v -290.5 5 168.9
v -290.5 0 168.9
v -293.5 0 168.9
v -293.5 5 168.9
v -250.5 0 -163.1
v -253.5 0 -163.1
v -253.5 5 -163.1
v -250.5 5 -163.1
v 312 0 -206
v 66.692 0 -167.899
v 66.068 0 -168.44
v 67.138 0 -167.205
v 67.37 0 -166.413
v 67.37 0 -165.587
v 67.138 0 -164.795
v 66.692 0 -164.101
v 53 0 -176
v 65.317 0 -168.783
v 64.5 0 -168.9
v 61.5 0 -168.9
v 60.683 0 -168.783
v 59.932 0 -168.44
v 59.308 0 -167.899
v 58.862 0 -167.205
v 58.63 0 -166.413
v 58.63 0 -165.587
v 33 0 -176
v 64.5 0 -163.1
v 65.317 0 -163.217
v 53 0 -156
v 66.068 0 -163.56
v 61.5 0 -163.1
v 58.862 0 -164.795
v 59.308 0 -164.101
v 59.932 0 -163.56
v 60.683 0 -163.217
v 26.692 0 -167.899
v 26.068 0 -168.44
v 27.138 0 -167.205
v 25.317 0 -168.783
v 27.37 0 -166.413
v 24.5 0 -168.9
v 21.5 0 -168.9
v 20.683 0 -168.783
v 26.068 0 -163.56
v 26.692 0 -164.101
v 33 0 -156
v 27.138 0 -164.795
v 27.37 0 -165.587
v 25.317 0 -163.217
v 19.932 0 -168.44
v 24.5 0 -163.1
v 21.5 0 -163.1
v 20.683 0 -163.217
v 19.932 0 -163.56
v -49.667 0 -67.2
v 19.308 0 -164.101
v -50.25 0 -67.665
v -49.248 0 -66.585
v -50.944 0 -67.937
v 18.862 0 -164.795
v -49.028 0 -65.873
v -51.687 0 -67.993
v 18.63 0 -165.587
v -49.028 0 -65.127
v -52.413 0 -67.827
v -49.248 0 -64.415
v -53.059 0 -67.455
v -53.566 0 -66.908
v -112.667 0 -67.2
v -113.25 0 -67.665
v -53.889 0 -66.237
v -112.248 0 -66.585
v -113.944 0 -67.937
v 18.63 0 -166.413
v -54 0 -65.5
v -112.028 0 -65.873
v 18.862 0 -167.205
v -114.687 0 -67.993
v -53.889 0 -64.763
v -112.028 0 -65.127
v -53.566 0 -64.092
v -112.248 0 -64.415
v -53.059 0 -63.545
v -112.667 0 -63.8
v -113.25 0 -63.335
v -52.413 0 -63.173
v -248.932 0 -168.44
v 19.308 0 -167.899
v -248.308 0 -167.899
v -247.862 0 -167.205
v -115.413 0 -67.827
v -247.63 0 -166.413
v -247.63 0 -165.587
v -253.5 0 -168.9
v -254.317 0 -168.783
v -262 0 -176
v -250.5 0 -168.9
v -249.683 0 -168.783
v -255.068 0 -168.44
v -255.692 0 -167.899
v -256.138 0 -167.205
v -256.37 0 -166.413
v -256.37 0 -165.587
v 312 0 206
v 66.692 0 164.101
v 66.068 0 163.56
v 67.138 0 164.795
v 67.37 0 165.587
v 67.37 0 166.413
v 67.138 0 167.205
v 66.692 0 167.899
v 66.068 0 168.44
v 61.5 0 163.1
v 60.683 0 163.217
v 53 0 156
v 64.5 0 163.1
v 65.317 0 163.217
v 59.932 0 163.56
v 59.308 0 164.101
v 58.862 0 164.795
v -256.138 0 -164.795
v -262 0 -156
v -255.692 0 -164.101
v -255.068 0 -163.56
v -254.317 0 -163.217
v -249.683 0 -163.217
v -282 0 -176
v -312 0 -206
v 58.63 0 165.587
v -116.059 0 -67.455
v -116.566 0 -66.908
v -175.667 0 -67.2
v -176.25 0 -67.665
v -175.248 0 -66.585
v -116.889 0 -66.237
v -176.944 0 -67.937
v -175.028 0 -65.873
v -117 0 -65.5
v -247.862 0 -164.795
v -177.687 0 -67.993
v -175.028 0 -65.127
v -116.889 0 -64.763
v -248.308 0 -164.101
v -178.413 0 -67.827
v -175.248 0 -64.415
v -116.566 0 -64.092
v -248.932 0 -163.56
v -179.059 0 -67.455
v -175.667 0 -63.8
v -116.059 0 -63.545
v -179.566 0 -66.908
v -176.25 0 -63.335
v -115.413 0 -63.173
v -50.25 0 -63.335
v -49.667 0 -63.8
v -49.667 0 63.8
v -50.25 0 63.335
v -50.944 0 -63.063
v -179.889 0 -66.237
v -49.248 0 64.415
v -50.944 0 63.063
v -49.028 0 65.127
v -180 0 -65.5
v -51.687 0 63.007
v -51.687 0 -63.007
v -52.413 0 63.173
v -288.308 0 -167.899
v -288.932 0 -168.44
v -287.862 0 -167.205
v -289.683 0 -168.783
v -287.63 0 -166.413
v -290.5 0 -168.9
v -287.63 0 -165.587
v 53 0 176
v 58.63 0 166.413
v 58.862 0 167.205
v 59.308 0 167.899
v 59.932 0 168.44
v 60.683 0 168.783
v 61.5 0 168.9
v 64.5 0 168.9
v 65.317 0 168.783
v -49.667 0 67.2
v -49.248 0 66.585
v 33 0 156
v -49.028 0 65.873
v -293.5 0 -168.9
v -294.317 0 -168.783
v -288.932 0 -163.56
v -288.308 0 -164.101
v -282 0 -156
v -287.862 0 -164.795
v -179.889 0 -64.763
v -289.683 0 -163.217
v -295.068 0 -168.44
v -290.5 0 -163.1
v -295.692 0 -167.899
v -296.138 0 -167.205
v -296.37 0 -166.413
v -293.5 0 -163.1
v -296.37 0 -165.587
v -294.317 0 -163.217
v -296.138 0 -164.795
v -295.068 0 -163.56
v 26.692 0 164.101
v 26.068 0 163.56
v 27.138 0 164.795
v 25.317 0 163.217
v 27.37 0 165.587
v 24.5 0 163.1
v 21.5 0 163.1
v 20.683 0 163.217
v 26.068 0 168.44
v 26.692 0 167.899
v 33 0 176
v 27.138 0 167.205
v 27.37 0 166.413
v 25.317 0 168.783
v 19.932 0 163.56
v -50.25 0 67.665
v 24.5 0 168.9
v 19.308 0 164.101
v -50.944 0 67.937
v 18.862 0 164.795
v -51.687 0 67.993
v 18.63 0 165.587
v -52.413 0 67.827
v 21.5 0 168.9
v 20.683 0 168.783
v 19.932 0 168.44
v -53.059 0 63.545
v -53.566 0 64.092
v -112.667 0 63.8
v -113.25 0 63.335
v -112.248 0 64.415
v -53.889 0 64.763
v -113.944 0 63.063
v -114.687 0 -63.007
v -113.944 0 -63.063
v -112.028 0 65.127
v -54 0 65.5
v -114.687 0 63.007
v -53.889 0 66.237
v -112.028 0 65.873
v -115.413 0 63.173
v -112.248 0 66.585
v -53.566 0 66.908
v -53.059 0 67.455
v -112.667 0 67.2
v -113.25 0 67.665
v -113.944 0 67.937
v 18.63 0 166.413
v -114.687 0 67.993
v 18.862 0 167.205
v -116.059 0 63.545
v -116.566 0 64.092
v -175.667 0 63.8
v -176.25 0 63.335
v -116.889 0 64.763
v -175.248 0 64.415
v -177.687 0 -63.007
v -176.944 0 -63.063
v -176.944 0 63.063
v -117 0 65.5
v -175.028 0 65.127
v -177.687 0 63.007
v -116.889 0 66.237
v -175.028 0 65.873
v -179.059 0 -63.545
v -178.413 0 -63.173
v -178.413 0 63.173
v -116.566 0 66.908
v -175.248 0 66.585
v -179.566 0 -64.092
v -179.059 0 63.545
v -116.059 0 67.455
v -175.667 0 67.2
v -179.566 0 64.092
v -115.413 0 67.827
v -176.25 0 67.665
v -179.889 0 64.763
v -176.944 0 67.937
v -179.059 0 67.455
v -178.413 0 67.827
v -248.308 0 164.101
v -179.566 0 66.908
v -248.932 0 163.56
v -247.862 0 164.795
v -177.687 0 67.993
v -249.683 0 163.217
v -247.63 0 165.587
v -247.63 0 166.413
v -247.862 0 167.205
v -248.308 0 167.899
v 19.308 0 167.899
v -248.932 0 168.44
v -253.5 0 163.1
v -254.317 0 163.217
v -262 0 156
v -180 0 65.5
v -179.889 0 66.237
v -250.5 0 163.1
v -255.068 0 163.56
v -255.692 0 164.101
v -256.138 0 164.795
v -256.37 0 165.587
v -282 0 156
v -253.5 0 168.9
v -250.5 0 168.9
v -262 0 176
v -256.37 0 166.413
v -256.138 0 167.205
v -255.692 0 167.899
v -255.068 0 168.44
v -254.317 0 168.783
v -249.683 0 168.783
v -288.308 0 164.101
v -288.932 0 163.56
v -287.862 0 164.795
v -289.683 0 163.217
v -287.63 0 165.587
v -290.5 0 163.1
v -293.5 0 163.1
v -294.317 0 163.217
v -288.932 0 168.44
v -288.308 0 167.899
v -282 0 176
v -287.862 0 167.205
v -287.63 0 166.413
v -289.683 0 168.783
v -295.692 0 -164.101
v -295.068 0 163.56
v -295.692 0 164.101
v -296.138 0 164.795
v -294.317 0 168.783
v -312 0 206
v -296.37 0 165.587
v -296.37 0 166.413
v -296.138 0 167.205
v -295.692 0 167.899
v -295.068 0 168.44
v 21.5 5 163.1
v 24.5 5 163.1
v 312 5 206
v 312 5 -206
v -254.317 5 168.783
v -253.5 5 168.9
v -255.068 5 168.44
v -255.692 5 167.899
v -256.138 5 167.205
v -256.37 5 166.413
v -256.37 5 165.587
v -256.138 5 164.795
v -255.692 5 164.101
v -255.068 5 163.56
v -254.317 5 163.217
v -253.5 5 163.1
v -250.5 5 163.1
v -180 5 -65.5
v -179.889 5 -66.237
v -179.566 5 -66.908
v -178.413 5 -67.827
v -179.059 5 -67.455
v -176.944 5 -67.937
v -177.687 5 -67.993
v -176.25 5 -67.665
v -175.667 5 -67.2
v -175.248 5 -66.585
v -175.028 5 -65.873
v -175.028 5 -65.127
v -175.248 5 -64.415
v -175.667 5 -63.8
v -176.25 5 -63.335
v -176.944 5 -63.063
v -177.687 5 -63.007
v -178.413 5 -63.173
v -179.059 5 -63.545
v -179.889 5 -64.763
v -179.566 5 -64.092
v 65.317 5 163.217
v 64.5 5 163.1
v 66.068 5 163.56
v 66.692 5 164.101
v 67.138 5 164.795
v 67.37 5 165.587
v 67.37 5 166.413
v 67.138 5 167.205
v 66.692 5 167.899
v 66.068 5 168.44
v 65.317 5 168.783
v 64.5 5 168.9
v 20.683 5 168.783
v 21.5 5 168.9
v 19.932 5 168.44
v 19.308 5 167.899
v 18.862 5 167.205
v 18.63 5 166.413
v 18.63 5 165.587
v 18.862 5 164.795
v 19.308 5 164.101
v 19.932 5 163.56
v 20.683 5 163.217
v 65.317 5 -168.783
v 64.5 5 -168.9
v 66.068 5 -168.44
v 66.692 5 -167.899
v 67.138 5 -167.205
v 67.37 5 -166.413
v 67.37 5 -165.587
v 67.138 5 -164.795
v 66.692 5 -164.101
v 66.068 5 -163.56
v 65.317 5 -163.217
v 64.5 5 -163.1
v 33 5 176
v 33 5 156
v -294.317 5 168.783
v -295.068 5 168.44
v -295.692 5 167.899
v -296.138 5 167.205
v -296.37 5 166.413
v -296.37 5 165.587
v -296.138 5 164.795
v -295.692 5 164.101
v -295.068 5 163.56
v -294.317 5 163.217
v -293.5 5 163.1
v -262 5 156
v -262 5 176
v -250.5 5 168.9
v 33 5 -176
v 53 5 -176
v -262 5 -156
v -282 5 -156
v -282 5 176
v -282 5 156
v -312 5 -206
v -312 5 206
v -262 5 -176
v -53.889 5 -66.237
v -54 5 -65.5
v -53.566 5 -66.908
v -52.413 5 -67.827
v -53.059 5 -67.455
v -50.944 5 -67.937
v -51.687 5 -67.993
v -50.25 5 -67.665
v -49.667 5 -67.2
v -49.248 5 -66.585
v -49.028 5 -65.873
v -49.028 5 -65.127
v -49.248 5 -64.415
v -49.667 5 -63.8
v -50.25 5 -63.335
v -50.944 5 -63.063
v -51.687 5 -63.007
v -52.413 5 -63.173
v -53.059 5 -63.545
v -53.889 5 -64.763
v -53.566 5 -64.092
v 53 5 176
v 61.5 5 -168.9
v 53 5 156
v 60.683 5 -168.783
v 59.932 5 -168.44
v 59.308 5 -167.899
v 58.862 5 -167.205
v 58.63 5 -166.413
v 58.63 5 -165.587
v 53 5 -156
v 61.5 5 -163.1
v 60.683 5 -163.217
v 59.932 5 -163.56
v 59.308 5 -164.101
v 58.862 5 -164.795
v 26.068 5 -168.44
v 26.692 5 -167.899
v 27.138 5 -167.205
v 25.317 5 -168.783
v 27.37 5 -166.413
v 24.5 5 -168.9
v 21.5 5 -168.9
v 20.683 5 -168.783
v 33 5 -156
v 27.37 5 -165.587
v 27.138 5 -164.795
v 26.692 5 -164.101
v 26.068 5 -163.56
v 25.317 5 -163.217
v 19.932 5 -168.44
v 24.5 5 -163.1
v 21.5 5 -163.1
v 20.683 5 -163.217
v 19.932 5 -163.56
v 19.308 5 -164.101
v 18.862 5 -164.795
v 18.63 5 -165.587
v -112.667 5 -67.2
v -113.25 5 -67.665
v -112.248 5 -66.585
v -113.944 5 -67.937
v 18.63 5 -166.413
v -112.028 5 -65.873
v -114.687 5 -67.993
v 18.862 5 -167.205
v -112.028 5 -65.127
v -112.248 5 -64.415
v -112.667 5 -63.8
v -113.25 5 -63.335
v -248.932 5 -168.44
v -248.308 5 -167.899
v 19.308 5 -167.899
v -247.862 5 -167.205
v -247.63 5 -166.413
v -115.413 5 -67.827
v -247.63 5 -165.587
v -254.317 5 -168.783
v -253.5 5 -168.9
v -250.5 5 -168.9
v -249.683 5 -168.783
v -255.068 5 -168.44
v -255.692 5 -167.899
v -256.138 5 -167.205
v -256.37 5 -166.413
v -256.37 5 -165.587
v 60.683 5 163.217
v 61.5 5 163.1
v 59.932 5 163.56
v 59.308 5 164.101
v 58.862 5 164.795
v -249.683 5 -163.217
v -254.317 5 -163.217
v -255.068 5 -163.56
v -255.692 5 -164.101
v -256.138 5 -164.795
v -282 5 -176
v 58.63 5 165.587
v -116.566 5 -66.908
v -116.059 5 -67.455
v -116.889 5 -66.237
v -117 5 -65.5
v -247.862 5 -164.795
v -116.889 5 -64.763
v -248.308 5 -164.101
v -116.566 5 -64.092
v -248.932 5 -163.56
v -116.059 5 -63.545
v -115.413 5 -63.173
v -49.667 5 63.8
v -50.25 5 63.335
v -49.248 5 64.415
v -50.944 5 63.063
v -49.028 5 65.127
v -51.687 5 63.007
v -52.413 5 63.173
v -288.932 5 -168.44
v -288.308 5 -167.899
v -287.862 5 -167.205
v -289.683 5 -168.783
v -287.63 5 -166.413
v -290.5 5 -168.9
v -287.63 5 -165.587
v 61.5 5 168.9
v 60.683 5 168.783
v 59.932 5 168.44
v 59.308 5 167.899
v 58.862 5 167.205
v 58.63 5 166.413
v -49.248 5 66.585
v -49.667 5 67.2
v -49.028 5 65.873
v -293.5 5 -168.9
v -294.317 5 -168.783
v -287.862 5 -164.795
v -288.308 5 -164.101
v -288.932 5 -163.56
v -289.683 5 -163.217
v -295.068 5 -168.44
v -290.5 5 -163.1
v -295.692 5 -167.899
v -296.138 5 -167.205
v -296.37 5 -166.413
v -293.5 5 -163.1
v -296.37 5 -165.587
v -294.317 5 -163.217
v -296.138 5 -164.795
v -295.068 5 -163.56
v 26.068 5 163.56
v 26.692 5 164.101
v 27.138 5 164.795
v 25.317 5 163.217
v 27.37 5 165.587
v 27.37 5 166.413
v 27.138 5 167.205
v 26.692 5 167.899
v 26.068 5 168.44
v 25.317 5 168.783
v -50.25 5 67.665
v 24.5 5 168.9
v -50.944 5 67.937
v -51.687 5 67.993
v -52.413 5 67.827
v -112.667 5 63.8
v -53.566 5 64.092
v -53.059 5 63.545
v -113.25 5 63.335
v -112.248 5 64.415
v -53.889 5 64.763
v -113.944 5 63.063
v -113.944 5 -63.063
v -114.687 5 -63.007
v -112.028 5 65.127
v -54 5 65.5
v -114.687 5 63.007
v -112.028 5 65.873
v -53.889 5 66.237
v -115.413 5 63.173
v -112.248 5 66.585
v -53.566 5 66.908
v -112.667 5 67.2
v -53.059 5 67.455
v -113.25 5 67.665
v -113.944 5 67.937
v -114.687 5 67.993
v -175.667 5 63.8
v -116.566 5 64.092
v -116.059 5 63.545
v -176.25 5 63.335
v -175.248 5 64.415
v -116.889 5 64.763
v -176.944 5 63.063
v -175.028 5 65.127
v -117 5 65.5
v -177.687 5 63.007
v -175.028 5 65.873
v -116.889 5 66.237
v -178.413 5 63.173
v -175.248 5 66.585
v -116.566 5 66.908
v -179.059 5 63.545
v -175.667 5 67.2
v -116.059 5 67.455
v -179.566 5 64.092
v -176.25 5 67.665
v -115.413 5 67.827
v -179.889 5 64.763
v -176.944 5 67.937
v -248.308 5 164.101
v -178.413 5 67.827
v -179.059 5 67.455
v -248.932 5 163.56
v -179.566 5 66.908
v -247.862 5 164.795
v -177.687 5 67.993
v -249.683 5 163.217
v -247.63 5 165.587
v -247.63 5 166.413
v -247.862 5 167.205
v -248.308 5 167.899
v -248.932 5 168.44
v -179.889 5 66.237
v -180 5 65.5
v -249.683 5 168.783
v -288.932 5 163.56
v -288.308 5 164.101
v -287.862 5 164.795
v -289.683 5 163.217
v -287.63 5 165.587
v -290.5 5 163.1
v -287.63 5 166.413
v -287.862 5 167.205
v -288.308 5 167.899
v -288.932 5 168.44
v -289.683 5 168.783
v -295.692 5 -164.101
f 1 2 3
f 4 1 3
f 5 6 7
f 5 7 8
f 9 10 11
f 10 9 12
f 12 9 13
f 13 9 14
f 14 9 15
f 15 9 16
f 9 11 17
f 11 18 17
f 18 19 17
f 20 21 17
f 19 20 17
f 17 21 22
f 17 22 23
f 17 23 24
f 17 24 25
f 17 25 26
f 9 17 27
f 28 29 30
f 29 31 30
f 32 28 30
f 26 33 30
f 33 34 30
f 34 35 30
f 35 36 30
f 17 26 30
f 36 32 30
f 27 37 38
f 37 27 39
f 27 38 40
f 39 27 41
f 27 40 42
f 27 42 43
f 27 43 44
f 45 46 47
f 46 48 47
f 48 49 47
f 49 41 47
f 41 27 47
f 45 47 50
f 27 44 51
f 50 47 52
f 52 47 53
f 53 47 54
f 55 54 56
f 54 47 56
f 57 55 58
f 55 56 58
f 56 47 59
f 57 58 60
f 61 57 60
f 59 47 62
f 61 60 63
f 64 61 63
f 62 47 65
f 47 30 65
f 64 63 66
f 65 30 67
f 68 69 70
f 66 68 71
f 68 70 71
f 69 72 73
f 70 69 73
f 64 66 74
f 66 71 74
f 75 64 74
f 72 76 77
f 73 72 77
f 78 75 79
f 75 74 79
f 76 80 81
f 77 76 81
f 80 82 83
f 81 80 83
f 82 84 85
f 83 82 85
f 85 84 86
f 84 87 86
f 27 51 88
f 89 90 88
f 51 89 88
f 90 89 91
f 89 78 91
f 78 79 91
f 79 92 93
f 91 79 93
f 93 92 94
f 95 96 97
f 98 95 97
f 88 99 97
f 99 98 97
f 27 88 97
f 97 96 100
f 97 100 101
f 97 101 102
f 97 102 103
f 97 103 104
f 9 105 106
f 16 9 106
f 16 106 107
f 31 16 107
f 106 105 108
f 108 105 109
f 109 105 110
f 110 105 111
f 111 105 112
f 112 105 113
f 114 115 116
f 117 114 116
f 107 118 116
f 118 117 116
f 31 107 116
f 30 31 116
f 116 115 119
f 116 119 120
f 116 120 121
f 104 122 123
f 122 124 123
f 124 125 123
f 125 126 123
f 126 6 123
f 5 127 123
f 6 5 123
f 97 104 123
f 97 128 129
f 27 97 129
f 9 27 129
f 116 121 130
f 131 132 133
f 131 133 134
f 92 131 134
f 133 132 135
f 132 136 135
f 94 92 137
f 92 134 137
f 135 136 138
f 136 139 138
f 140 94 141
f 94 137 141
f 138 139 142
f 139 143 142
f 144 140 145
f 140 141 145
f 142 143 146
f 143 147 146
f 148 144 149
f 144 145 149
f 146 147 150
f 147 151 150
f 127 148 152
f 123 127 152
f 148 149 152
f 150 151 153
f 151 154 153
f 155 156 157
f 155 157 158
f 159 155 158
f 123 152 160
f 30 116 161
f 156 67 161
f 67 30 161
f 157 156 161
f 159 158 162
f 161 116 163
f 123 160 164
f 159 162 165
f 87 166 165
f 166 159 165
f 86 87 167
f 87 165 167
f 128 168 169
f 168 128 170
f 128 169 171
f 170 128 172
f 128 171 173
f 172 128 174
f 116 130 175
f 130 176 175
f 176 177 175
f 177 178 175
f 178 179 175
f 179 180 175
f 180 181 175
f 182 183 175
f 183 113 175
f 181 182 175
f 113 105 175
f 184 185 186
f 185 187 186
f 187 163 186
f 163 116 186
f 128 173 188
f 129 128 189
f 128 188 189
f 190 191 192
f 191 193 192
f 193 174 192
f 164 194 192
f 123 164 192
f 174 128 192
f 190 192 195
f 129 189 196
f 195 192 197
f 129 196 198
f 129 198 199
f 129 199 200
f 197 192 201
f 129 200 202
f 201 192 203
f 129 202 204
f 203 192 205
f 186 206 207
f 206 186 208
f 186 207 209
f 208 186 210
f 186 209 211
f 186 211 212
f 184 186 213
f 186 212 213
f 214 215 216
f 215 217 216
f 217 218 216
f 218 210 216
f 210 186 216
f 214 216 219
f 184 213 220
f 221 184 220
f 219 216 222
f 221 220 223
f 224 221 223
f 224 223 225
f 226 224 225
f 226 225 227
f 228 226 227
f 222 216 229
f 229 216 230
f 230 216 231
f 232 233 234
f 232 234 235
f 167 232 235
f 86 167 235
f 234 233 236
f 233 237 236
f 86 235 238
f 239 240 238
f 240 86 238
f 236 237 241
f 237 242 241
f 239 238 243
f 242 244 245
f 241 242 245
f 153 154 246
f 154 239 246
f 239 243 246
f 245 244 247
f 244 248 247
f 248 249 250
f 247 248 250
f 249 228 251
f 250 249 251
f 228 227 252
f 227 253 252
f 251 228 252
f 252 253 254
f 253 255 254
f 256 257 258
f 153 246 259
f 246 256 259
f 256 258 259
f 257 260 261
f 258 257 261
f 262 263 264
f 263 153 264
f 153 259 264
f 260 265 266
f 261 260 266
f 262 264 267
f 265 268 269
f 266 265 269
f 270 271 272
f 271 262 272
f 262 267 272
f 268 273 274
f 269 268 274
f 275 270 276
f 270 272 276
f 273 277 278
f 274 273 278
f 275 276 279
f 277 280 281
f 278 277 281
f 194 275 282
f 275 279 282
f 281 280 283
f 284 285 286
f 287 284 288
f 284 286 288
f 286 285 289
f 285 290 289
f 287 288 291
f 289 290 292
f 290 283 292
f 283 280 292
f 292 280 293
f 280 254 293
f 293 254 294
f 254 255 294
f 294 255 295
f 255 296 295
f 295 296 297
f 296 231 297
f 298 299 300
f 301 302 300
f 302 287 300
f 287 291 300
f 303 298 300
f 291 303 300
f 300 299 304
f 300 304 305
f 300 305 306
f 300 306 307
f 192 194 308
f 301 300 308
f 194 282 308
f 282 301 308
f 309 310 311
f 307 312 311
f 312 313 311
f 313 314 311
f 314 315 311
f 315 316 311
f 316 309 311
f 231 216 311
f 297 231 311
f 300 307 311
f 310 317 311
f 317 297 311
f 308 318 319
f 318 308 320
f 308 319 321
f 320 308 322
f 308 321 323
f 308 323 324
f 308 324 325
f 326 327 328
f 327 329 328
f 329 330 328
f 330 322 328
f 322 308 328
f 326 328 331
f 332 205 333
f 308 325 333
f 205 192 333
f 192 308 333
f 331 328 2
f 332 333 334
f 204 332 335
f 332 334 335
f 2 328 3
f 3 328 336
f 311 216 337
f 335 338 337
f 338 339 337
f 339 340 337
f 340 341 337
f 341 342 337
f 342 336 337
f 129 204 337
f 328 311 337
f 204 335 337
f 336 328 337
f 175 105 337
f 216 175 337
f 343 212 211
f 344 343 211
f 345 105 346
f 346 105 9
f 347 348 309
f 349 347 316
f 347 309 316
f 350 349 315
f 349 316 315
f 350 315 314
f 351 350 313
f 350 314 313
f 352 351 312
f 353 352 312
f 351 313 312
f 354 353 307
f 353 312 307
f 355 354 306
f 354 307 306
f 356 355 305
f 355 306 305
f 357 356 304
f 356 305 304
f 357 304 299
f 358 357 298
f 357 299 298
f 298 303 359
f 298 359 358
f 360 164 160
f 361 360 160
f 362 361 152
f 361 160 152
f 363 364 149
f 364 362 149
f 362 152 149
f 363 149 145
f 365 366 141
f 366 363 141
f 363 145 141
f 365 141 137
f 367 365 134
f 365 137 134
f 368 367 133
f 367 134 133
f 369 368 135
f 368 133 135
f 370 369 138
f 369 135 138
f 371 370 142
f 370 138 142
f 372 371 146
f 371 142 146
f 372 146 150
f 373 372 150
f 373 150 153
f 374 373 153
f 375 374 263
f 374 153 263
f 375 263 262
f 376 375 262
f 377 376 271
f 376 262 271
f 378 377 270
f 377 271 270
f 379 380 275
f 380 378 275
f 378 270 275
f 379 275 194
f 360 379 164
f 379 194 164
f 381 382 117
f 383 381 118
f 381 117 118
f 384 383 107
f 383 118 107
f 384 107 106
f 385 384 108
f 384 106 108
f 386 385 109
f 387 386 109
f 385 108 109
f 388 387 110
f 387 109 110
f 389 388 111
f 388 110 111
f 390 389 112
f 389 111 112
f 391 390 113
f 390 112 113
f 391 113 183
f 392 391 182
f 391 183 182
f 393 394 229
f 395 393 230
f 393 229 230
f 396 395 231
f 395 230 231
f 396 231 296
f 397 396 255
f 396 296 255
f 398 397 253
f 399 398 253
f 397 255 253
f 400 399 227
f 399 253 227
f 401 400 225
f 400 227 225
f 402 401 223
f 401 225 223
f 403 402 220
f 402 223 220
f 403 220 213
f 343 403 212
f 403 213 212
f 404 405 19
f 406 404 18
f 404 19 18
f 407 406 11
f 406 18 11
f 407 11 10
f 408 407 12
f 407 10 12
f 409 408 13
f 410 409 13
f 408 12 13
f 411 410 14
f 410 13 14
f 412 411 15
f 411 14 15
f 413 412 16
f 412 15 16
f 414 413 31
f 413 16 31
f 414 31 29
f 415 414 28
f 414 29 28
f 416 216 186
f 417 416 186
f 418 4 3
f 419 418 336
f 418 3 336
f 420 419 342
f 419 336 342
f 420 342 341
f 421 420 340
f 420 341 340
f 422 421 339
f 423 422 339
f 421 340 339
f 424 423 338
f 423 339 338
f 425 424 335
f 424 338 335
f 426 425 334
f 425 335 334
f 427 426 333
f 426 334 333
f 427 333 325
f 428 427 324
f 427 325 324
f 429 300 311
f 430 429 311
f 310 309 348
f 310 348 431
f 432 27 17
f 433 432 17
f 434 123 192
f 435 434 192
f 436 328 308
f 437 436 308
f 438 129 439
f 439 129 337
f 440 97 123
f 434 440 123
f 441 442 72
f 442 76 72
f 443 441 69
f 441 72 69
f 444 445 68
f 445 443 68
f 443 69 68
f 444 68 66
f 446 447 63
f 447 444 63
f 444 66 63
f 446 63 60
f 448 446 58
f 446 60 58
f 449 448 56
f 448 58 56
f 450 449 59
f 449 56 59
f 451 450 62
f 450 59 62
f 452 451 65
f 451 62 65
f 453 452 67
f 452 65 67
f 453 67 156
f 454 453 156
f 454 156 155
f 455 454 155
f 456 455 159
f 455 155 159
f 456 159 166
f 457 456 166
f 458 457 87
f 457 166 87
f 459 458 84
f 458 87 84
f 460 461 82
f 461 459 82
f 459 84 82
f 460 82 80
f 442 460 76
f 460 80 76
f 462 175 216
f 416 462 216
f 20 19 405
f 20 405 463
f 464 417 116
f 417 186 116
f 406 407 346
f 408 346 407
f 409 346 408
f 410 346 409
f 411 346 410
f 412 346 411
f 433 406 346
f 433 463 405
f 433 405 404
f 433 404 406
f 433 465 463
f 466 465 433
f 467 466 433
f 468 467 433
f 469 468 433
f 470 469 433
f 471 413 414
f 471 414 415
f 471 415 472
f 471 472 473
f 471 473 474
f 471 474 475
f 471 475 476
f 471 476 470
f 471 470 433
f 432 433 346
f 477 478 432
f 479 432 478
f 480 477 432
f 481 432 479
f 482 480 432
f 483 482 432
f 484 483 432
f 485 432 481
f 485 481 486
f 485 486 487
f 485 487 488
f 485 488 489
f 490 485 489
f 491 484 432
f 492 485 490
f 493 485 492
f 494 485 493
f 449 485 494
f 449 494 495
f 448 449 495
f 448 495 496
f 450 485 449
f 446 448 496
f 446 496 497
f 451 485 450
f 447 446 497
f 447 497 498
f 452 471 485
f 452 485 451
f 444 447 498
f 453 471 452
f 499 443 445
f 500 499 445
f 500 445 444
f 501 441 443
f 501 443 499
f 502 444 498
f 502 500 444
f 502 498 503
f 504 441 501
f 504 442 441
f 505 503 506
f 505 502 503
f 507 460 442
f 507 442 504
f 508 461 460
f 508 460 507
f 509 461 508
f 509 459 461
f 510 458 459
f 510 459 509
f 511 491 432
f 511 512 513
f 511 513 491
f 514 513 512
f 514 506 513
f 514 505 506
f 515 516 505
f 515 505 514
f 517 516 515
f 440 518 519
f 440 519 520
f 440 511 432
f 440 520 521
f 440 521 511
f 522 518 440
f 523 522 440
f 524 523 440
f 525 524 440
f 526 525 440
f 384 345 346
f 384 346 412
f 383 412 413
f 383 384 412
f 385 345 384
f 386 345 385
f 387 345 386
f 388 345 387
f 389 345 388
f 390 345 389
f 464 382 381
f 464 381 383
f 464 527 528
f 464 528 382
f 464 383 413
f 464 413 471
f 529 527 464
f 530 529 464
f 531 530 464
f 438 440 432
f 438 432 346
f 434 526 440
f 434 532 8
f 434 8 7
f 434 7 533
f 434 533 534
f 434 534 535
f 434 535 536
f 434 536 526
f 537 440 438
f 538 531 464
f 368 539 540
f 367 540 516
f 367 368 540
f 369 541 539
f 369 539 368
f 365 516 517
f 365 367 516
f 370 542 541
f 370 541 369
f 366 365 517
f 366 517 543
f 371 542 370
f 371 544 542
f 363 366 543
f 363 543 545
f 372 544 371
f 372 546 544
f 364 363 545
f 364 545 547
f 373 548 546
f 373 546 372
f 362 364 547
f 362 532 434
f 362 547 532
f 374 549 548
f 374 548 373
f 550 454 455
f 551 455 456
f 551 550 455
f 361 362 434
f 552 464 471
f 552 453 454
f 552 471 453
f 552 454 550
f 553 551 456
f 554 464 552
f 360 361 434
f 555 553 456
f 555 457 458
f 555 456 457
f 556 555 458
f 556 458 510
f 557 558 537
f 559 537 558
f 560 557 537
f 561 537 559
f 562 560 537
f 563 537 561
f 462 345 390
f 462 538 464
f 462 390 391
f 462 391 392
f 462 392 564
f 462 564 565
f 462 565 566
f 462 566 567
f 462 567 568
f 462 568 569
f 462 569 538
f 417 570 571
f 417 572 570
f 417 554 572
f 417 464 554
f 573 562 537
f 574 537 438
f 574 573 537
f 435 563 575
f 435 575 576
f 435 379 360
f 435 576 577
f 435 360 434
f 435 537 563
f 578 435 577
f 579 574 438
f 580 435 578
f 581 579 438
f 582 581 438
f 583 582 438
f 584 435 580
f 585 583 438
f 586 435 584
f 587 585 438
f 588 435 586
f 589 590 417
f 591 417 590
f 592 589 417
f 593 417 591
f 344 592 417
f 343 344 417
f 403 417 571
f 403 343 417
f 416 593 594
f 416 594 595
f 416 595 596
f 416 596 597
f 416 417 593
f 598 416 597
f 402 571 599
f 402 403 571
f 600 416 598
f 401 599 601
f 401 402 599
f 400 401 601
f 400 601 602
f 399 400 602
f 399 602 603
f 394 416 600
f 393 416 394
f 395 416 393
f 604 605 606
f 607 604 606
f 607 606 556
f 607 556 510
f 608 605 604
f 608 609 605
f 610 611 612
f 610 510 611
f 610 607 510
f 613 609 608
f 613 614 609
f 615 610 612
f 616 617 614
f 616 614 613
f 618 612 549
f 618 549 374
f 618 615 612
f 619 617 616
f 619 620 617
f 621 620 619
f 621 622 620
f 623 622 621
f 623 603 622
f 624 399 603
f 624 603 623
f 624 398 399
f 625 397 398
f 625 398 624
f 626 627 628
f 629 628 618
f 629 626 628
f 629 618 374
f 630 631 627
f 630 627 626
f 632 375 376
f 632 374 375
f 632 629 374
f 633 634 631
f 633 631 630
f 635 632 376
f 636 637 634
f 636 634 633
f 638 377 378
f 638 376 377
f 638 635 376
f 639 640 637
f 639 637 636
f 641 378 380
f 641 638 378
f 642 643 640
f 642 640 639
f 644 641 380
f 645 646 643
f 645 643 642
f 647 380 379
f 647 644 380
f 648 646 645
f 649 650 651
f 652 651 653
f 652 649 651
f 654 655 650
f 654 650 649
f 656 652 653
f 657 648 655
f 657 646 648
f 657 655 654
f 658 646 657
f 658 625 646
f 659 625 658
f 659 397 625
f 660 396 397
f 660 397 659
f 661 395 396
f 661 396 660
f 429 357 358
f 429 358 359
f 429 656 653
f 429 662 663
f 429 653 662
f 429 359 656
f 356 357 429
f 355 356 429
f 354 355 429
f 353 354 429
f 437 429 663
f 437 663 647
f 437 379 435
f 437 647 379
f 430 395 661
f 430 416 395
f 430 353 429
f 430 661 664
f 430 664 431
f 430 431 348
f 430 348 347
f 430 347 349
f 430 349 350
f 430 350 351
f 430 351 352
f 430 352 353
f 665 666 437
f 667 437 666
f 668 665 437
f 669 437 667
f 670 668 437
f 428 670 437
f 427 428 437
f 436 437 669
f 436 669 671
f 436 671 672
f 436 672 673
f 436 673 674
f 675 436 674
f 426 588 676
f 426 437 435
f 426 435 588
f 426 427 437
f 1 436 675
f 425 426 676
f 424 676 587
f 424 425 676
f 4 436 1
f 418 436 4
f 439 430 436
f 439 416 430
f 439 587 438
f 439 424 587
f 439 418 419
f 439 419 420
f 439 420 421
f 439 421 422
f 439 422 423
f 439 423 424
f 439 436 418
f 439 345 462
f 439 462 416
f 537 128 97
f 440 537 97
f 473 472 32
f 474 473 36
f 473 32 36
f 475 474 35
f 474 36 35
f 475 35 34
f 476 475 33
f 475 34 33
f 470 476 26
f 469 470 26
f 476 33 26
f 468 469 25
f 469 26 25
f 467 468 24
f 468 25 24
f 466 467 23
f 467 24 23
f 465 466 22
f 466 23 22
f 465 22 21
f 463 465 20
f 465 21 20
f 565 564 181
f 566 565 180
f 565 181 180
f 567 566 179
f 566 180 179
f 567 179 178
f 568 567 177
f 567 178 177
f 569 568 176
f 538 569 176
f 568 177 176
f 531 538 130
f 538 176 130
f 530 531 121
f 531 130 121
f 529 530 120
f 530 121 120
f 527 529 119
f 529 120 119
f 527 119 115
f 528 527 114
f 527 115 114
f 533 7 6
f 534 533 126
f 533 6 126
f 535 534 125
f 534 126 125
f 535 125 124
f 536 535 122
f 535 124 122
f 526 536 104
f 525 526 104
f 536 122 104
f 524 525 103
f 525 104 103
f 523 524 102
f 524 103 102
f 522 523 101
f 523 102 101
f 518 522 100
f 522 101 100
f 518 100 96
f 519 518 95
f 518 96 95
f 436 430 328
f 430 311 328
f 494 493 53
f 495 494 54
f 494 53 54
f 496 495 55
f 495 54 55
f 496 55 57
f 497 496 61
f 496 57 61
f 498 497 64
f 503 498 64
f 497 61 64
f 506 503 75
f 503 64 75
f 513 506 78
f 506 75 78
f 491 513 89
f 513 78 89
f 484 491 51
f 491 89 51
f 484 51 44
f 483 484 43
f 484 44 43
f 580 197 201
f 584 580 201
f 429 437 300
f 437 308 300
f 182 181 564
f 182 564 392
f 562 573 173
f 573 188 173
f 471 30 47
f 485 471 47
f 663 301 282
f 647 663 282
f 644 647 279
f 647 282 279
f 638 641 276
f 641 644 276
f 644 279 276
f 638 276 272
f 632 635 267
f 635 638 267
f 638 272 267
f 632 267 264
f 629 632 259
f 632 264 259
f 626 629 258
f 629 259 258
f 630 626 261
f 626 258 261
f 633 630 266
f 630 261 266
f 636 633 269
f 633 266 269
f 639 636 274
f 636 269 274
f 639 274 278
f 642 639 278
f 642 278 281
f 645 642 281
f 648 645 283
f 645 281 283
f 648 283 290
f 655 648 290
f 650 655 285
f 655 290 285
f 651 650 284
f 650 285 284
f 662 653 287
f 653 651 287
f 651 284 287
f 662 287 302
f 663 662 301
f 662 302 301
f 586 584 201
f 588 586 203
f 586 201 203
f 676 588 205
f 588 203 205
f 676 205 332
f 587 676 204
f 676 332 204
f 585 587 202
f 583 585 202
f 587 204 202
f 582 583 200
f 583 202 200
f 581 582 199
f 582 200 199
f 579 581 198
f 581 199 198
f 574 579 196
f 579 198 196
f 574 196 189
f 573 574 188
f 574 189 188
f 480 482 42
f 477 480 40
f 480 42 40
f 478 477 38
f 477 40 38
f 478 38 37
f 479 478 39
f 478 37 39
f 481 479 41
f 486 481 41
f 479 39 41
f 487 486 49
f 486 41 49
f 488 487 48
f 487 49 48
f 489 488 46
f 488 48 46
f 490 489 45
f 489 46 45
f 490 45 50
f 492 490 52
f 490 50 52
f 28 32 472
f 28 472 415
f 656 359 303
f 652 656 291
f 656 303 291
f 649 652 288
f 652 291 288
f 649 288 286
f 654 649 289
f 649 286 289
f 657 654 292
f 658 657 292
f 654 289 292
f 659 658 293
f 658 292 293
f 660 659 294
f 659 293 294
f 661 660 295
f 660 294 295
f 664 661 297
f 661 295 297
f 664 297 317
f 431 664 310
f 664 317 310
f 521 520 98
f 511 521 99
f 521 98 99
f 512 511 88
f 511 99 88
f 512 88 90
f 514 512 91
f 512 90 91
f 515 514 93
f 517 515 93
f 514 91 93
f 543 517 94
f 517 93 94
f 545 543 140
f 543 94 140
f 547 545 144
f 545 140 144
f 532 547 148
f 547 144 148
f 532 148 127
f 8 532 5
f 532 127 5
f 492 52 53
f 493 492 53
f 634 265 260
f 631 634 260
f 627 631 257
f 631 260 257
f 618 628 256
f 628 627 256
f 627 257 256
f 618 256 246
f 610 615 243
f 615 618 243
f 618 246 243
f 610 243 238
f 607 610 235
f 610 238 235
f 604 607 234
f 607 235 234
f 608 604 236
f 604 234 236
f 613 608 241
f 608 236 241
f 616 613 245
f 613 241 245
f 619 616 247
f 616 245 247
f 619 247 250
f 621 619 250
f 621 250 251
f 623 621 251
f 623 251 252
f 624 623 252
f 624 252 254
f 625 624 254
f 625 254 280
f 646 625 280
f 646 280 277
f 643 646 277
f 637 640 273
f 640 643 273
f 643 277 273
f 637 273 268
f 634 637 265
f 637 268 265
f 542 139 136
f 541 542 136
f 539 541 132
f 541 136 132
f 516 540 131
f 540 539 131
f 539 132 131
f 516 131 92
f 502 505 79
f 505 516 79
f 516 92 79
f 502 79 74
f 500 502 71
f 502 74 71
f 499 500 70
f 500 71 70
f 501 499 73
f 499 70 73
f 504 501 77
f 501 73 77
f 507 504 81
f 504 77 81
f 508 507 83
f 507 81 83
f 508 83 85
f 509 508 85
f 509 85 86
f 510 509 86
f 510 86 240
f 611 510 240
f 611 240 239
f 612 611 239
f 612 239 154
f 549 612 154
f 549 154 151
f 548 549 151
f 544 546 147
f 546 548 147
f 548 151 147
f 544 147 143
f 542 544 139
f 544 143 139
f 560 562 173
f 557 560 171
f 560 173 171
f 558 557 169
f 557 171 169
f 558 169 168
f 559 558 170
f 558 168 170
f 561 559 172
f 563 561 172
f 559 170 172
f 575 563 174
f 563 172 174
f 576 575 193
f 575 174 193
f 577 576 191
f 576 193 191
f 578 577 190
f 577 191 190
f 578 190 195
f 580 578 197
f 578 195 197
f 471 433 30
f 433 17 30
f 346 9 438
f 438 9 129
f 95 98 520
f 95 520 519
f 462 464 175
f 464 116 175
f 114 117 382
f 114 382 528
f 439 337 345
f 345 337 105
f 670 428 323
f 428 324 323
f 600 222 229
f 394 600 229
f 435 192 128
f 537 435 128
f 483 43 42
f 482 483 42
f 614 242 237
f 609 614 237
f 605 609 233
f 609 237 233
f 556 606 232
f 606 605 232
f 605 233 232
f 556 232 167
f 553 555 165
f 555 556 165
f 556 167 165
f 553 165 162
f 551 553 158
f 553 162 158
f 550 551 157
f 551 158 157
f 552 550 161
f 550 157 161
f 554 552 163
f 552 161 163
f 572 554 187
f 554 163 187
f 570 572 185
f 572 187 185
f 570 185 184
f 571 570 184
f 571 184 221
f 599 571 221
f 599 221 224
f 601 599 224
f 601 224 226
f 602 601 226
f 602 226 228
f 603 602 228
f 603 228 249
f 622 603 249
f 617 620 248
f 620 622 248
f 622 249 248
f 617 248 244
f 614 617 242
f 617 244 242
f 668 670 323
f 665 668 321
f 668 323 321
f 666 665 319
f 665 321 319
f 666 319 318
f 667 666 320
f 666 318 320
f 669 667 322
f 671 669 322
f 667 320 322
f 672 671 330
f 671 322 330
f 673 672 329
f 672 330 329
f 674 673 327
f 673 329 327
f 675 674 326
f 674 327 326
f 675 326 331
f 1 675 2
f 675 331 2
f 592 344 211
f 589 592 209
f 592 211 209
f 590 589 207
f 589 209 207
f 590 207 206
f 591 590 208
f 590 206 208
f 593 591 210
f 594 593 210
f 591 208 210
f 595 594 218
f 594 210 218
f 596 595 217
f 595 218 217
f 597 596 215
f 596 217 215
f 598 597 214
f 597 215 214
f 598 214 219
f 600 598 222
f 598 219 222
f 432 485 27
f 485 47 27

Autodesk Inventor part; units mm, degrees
ref_plane "YZ Plane" through (0, 0, 0) normal (1, 0, 0) x (0, 1, 0)
ref_plane "XZ Plane" through (0, 0, 0) normal (0, 1, 0) x (-1, 0, 0)
ref_plane "XY Plane" through (0, 0, 0) normal (0, 0, 1) x (1, 0, 0)
sketch "Sketch1" plane through (0, 0, 0) normal (0, 1, 0) x (-1, 0, 0)
  line L0 (312, 206) -> (-312, 206)
  line L1 (-312, 206) -> (-312, -206)
  line L2 (-312, -206) -> (312, -206)
  line L3 (312, -206) -> (312, 206)
  circle A0 centre (177.5, 65.5) radius 2.5
  line L4 (0, 206) -> (0, -206) construction
  line L5 (312, 0) -> (-312, 0) construction
  circle A1 centre (177.5, -65.5) radius 2.5
  circle A2 centre (114.5, 65.5) radius 2.5
  circle A3 centre (114.5, -65.5) radius 2.5
  circle A4 centre (51.5, 65.5) radius 2.5
  circle A5 centre (51.5, -65.5) radius 2.5
  line L6 (282, -176) -> (262, -176)
  line L7 (262, -176) -> (262, -156)
  line L8 (262, -156) -> (282, -156)
  line L9 (282, -156) -> (282, -176)
  line L10 (-83, -206) -> (-83, 206)
  line L11 (253.5, -166) -> (250.5, -166) construction
  line L12 (253.5, -163.1) -> (250.5, -163.1)
  line L13 (250.5, -168.9) -> (253.5, -168.9)
  arc A6 (253.5, -168.9) -> (253.5, -163.1) centre (253.5, -166) ccw
  arc A7 (250.5, -163.1) -> (250.5, -168.9) centre (250.5, -166) ccw
  line L14 (272, -176) -> (272, -156) construction
  line L15 (290.5, -166) -> (293.5, -166) construction
  line L16 (290.5, -163.1) -> (293.5, -163.1)
  line L17 (293.5, -168.9) -> (290.5, -168.9)
  arc A8 (290.5, -163.1) -> (290.5, -168.9) centre (290.5, -166) ccw
  arc A9 (293.5, -168.9) -> (293.5, -163.1) centre (293.5, -166) ccw
  line L18 (282, -166) -> (262, -166) construction
  line L19 (114.5, 206) -> (114.5, -206) construction
  arc A10 (250.5, 168.9) -> (250.5, 163.1) centre (250.5, 166) ccw
  line L20 (282, 176) -> (282, 156)
  arc A11 (290.5, 168.9) -> (290.5, 163.1) centre (290.5, 166) ccw
  line L21 (290.5, 166) -> (293.5, 166) construction
  line L22 (293.5, 163.1) -> (290.5, 163.1)
  arc A12 (293.5, 163.1) -> (293.5, 168.9) centre (293.5, 166) ccw
  line L23 (290.5, 168.9) -> (293.5, 168.9)
  line L24 (282, 156) -> (262, 156)
  line L25 (272, 156) -> (272, 176) construction
  line L26 (282, 166) -> (262, 166) construction
  line L27 (262, 176) -> (282, 176)
  line L28 (262, 156) -> (262, 176)
  arc A13 (253.5, 163.1) -> (253.5, 168.9) centre (253.5, 166) ccw
  line L29 (253.5, 168.9) -> (250.5, 168.9)
  line L30 (253.5, 166) -> (250.5, 166) construction
  line L31 (250.5, 163.1) -> (253.5, 163.1)
  arc A14 (-64.5, -163.1) -> (-64.5, -168.9) centre (-64.5, -166) ccw
  line L32 (-33, -156) -> (-33, -176)
  arc A15 (-24.5, -163.1) -> (-24.5, -168.9) centre (-24.5, -166) ccw
  line L33 (-24.5, -166) -> (-21.5, -166) construction
  line L34 (-21.5, -168.9) -> (-24.5, -168.9)
  arc A16 (-21.5, -168.9) -> (-21.5, -163.1) centre (-21.5, -166) ccw
  line L35 (-24.5, -163.1) -> (-21.5, -163.1)
  line L36 (-33, -176) -> (-53, -176)
  line L37 (-43, -176) -> (-43, -156) construction
  line L38 (-33, -166) -> (-53, -166) construction
  line L39 (-53, -156) -> (-33, -156)
  line L40 (-53, -176) -> (-53, -156)
  arc A17 (-61.5, -168.9) -> (-61.5, -163.1) centre (-61.5, -166) ccw
  line L41 (-61.5, -163.1) -> (-64.5, -163.1)
  line L42 (-61.5, -166) -> (-64.5, -166) construction
  line L43 (-64.5, -168.9) -> (-61.5, -168.9)
  arc A18 (-64.5, 168.9) -> (-64.5, 163.1) centre (-64.5, 166) ccw
  line L44 (-33, 176) -> (-33, 156)
  arc A19 (-24.5, 168.9) -> (-24.5, 163.1) centre (-24.5, 166) ccw
  line L45 (-24.5, 166) -> (-21.5, 166) construction
  line L46 (-21.5, 163.1) -> (-24.5, 163.1)
  arc A20 (-21.5, 163.1) -> (-21.5, 168.9) centre (-21.5, 166) ccw
  line L47 (-24.5, 168.9) -> (-21.5, 168.9)
  line L48 (-33, 156) -> (-53, 156)
  line L49 (-43, 156) -> (-43, 176) construction
  line L50 (-33, 166) -> (-53, 166) construction
  line L51 (-53, 176) -> (-33, 176)
  line L52 (-53, 156) -> (-53, 176)
  arc A21 (-61.5, 163.1) -> (-61.5, 168.9) centre (-61.5, 166) ccw
  line L53 (-61.5, 168.9) -> (-64.5, 168.9)
  line L54 (-61.5, 166) -> (-64.5, 166) construction
  line L55 (-64.5, 163.1) -> (-61.5, 163.1)
  point P0 (0, 0)
  point P1 (-83, 0)
  point P2 (252, -166)
  point P3 (292, -166)
  point P4 (272, -166)
  point P5 (114.5, 0)
  point P6 (292, 166)
  point P7 (272, 166)
  point P8 (252, 166)
  point P9 (-23, -166)
  point P10 (-43, -166)
  point P11 (-63, -166)
  point P12 (-23, 166)
  point P13 (-43, 166)
  point P14 (-63, 166)
  dimension "d0" = 412
  dimension "d1" = 624
  dimension "d3" = 5
  dimension "d6" = 131
  dimension "d9" = 63
  dimension "d15" = 20
  dimension "d16" = 20
  dimension "d17" = 30
  dimension "d18" = 30
  dimension "d26" = 1.5
  dimension "d27" = 5.8
  dimension "d28" = 8.5
  dimension "d51" = 395
  dimension "d52" = 197.5
  dimension "d63" = 332
  dimension "d66" = 315
extrude "Extrusion1" add sketch "Sketch1" along normal blind 5 contours L3 L2 L10 L0 | L10 L2 L1 L0 | L6 L7 L8 L9 | A6 L13 A7 L12 | L16 A9 L17 A8 | L29 A13 L31 A10 | L20 L24 L28 L27 | L23 A12 L22 A11 | L41 A17 L43 A14 | L32 L36 L40 L39 | L35 A16 L34 A15 | L53 A21 L55 A18 | L44 L48 L52 L51 | L47 A20 L46 A19
extrude "Extrusion2" cut sketch "Sketch1" along normal through all contours L6 L7 L8 L9 | A6 L13 A7 L12 | L16 A9 L17 A8 | L29 A13 L31 A10 | L20 L24 L28 L27 | L23 A12 L22 A11 | L41 A17 L43 A14 | L32 L36 L40 L39 | L35 A16 L34 A15 | L53 A21 L55 A18 | L44 L48 L52 L51 | L47 A20 L46 A19
equation "\"d0\" = BaseTotalWidth"
equation "\"d1\" = BaseTotalLength"
equation "\"d6\" = 2 * GridTotalSize + DistanceBetweenGrid"
equation "\"d9\" = GridTotalSize"
equation "\"d15\" = AluminiumExtrusionBase"
equation "\"d16\" = AluminiumExtrusionBase"
equation "\"d17\" = AluminiumExtrusionClearance"
equation "\"d18\" = AluminiumExtrusionClearance"
equation "\"d51\" = WorkspaceLength"
equation "\"d52\" = 0.5 * WorkspaceLength"
equation "\"d63\" = WorkspaceWidth"
equation "\"d66\" = -2 * AluminiumExtrusionClearance + WorkspaceLength - AluminiumExtrusionBase"
equation "\"GridBorderThickness\" = 5"
equation "\"GridBorderFillets\" = 7"
equation "\"GridTotalSize\" = 63"
equation "\"GridProcutClearance\" = 3"
equation "\"AluminiumExtrusionBase\" = 20"
equation "\"AluminiumExtrusionClearance\" = 30"
equation "\"BaseTotalWidth\" = 412"
equation "\"BaseTotalLength\" = 624"
equation "\"DistanceBetweenGrid\" = 5"
equation "\"WorkspaceLength\" = 395"
equation "\"WorkspaceWidth\" = 332"
equation "\"AxesBaseFillet\" = 15"
equation "\"Zaxis\" = 127"
properties part number "UpperBase" material "MDF Medium Density Fiberboard"
